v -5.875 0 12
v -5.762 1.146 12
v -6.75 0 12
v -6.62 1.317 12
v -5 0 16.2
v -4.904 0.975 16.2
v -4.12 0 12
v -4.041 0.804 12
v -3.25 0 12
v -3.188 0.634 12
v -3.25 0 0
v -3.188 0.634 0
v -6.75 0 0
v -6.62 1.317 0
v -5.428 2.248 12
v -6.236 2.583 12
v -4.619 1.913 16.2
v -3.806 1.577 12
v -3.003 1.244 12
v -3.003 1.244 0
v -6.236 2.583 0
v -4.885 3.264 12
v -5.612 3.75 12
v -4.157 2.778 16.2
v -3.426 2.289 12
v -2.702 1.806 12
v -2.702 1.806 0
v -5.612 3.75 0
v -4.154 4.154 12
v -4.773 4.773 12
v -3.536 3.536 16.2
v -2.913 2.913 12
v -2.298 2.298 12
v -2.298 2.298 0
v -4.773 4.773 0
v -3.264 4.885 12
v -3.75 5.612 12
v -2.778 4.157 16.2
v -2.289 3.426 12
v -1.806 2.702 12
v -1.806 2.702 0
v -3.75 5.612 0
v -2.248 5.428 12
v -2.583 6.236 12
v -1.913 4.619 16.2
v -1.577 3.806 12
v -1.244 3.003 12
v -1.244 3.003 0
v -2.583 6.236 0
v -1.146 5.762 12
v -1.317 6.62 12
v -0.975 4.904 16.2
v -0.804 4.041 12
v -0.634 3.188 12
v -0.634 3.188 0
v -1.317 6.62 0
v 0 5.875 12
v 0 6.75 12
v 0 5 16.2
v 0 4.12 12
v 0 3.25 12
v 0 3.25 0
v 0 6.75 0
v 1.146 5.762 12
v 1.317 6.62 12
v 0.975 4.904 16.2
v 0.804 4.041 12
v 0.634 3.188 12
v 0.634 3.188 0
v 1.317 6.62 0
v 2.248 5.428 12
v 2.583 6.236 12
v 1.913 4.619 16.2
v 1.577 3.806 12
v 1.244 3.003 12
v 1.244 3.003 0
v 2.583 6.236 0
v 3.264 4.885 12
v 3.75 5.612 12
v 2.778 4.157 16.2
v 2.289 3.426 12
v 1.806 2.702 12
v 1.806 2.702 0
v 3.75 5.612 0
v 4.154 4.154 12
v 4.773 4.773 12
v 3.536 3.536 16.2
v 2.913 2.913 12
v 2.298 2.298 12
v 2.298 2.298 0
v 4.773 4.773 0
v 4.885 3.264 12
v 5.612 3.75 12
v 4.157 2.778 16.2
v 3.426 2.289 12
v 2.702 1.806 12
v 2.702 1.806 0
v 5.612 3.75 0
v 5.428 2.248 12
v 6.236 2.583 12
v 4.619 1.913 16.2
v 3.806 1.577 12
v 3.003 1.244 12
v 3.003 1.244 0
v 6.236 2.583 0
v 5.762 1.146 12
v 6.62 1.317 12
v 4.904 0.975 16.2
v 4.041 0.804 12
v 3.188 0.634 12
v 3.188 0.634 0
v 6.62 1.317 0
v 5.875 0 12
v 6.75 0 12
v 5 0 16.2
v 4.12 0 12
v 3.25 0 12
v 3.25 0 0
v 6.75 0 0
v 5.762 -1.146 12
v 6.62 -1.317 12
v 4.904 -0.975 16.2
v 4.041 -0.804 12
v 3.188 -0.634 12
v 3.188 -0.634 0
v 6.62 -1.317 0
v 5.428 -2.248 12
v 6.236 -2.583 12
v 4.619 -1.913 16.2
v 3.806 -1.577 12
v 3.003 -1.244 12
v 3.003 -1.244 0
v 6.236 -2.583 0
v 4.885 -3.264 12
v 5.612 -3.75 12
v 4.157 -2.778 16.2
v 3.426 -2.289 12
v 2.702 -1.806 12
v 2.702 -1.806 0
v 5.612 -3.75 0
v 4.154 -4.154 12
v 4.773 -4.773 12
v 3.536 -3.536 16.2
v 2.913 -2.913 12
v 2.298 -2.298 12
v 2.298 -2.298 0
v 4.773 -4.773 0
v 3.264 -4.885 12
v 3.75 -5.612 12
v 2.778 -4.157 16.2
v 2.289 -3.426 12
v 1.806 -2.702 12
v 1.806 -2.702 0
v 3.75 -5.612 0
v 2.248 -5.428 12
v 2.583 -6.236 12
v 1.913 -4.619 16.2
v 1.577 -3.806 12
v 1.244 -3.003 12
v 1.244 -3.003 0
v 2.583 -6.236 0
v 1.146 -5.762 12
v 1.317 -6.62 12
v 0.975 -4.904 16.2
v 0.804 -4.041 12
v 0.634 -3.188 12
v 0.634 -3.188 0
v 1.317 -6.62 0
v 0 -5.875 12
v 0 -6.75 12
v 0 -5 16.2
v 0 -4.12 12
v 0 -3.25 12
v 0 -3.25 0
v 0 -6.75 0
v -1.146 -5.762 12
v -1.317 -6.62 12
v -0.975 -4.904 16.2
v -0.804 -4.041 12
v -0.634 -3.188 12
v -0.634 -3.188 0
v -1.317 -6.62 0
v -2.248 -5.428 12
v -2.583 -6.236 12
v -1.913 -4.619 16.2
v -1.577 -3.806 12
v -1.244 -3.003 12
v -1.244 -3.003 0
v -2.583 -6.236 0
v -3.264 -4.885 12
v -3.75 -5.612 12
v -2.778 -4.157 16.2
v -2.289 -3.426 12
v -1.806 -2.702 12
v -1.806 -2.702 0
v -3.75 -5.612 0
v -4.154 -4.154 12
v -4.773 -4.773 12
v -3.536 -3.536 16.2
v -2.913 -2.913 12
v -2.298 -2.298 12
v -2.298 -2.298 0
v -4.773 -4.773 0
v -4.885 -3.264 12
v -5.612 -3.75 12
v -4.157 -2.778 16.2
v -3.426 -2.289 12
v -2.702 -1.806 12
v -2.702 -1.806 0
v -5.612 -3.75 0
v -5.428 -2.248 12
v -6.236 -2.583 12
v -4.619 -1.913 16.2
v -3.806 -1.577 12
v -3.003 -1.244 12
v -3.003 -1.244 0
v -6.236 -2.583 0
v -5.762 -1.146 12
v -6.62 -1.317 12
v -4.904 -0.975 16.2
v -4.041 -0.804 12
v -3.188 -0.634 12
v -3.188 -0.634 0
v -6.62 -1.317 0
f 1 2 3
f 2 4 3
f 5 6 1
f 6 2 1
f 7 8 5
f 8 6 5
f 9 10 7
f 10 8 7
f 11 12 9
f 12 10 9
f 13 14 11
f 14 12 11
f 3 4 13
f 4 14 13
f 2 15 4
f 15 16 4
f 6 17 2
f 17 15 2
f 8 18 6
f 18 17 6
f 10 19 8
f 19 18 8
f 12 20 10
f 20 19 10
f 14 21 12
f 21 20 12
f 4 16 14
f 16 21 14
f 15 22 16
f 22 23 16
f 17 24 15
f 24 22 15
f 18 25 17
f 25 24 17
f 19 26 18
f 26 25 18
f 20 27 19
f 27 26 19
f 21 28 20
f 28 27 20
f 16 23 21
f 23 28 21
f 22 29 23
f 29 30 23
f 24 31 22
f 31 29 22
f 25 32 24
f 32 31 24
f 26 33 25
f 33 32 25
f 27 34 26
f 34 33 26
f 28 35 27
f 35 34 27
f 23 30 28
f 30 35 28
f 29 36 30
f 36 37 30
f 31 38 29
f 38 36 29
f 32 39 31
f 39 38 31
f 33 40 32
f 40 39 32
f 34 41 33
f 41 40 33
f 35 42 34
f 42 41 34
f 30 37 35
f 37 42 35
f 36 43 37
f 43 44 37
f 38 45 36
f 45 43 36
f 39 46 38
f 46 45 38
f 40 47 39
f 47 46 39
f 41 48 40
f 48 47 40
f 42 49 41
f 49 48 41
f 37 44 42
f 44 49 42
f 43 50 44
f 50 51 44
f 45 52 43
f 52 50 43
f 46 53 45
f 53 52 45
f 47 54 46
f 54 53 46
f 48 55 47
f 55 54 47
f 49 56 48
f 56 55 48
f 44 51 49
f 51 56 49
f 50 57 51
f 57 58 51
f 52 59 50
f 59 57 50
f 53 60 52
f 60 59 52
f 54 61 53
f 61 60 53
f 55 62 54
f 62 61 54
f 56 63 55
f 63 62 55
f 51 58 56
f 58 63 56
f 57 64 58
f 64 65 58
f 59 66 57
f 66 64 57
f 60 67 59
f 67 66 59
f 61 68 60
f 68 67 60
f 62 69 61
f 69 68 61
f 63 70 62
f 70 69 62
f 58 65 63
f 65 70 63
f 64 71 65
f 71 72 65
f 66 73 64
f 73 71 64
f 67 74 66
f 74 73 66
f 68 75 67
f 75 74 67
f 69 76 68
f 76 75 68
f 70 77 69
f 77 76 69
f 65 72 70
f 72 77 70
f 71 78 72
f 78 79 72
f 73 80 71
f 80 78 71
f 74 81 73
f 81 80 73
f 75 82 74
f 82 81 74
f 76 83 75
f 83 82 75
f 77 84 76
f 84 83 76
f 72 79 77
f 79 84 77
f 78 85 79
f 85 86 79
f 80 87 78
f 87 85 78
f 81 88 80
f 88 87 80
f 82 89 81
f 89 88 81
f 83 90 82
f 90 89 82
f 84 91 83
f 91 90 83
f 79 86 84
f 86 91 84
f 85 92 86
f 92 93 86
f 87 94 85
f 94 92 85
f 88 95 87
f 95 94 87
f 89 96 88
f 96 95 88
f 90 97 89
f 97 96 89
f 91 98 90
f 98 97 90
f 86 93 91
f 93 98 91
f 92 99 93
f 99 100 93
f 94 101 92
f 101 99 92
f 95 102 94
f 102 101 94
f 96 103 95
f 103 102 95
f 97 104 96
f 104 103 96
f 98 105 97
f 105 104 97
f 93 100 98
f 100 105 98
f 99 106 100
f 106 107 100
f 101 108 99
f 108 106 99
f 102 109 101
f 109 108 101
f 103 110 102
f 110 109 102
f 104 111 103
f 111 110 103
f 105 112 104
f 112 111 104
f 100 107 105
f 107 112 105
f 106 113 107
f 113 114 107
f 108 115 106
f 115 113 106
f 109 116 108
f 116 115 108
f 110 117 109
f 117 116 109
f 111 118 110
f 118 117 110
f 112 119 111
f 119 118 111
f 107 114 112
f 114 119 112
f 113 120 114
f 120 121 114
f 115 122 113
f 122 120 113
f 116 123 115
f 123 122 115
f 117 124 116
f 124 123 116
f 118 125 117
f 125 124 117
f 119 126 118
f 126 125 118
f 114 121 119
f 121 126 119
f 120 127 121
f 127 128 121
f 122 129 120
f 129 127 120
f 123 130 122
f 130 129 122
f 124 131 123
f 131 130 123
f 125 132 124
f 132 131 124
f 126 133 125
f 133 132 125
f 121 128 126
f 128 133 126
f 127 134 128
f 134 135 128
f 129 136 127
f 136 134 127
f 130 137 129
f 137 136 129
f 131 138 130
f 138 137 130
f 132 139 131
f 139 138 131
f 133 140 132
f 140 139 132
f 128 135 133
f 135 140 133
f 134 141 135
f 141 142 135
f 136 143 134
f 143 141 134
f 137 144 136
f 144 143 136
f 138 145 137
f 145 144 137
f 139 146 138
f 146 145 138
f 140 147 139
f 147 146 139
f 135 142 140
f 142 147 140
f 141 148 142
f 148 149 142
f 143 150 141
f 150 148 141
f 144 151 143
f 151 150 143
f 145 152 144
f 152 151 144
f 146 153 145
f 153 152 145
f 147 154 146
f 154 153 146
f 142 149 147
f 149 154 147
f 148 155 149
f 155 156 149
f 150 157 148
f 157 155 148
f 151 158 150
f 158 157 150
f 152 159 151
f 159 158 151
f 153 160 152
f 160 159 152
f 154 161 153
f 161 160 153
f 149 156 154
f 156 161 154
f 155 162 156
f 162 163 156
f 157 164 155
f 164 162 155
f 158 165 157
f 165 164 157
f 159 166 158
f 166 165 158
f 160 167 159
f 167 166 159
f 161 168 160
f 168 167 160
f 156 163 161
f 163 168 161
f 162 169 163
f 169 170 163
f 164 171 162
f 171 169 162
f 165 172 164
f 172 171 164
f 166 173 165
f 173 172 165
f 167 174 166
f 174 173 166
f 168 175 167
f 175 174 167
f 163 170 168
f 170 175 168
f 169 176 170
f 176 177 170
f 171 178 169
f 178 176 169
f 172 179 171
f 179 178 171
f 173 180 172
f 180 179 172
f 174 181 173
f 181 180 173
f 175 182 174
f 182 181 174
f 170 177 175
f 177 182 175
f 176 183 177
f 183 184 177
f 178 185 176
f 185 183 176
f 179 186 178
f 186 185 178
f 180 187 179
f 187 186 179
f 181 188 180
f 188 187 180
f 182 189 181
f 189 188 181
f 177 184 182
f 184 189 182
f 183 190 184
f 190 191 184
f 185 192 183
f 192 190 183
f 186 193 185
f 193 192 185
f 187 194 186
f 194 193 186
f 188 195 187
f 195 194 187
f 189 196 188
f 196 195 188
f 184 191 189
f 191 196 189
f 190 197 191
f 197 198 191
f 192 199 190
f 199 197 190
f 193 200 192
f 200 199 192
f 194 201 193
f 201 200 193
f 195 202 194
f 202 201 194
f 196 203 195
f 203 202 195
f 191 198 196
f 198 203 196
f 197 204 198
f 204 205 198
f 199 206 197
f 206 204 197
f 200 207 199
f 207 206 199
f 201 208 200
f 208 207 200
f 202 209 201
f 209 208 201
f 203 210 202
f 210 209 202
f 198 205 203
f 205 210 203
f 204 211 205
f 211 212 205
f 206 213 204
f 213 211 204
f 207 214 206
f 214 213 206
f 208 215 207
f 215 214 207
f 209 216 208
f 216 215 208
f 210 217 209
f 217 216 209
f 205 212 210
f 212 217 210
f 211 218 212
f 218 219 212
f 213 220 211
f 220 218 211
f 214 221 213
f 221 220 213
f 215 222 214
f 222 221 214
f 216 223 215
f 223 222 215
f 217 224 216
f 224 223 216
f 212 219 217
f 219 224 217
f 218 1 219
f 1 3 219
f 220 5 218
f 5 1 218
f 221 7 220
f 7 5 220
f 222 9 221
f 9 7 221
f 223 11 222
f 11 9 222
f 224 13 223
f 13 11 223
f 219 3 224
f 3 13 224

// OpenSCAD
$fn = 32;

// ----------------------------------------------------------------------
// Form washer: domed washer, 13.5 mm outside, 6.5 mm bore
// ----------------------------------------------------------------------

// --- parameters (mm) ---
revolve_angle = 360;      // full turn around the Z axis
profile_points = 7;       // points of the closed outline

profile = [[3.25, 0], [6.75, 0], [6.75, 12], [5.875, 12], [5, 16.2], [4.12, 12], [3.25, 12]];  // single closed polygon, 7 points, counter clockwise

// --- the one profile operation ---
rotate_extrude(angle = revolve_angle) polygon(points = profile);
